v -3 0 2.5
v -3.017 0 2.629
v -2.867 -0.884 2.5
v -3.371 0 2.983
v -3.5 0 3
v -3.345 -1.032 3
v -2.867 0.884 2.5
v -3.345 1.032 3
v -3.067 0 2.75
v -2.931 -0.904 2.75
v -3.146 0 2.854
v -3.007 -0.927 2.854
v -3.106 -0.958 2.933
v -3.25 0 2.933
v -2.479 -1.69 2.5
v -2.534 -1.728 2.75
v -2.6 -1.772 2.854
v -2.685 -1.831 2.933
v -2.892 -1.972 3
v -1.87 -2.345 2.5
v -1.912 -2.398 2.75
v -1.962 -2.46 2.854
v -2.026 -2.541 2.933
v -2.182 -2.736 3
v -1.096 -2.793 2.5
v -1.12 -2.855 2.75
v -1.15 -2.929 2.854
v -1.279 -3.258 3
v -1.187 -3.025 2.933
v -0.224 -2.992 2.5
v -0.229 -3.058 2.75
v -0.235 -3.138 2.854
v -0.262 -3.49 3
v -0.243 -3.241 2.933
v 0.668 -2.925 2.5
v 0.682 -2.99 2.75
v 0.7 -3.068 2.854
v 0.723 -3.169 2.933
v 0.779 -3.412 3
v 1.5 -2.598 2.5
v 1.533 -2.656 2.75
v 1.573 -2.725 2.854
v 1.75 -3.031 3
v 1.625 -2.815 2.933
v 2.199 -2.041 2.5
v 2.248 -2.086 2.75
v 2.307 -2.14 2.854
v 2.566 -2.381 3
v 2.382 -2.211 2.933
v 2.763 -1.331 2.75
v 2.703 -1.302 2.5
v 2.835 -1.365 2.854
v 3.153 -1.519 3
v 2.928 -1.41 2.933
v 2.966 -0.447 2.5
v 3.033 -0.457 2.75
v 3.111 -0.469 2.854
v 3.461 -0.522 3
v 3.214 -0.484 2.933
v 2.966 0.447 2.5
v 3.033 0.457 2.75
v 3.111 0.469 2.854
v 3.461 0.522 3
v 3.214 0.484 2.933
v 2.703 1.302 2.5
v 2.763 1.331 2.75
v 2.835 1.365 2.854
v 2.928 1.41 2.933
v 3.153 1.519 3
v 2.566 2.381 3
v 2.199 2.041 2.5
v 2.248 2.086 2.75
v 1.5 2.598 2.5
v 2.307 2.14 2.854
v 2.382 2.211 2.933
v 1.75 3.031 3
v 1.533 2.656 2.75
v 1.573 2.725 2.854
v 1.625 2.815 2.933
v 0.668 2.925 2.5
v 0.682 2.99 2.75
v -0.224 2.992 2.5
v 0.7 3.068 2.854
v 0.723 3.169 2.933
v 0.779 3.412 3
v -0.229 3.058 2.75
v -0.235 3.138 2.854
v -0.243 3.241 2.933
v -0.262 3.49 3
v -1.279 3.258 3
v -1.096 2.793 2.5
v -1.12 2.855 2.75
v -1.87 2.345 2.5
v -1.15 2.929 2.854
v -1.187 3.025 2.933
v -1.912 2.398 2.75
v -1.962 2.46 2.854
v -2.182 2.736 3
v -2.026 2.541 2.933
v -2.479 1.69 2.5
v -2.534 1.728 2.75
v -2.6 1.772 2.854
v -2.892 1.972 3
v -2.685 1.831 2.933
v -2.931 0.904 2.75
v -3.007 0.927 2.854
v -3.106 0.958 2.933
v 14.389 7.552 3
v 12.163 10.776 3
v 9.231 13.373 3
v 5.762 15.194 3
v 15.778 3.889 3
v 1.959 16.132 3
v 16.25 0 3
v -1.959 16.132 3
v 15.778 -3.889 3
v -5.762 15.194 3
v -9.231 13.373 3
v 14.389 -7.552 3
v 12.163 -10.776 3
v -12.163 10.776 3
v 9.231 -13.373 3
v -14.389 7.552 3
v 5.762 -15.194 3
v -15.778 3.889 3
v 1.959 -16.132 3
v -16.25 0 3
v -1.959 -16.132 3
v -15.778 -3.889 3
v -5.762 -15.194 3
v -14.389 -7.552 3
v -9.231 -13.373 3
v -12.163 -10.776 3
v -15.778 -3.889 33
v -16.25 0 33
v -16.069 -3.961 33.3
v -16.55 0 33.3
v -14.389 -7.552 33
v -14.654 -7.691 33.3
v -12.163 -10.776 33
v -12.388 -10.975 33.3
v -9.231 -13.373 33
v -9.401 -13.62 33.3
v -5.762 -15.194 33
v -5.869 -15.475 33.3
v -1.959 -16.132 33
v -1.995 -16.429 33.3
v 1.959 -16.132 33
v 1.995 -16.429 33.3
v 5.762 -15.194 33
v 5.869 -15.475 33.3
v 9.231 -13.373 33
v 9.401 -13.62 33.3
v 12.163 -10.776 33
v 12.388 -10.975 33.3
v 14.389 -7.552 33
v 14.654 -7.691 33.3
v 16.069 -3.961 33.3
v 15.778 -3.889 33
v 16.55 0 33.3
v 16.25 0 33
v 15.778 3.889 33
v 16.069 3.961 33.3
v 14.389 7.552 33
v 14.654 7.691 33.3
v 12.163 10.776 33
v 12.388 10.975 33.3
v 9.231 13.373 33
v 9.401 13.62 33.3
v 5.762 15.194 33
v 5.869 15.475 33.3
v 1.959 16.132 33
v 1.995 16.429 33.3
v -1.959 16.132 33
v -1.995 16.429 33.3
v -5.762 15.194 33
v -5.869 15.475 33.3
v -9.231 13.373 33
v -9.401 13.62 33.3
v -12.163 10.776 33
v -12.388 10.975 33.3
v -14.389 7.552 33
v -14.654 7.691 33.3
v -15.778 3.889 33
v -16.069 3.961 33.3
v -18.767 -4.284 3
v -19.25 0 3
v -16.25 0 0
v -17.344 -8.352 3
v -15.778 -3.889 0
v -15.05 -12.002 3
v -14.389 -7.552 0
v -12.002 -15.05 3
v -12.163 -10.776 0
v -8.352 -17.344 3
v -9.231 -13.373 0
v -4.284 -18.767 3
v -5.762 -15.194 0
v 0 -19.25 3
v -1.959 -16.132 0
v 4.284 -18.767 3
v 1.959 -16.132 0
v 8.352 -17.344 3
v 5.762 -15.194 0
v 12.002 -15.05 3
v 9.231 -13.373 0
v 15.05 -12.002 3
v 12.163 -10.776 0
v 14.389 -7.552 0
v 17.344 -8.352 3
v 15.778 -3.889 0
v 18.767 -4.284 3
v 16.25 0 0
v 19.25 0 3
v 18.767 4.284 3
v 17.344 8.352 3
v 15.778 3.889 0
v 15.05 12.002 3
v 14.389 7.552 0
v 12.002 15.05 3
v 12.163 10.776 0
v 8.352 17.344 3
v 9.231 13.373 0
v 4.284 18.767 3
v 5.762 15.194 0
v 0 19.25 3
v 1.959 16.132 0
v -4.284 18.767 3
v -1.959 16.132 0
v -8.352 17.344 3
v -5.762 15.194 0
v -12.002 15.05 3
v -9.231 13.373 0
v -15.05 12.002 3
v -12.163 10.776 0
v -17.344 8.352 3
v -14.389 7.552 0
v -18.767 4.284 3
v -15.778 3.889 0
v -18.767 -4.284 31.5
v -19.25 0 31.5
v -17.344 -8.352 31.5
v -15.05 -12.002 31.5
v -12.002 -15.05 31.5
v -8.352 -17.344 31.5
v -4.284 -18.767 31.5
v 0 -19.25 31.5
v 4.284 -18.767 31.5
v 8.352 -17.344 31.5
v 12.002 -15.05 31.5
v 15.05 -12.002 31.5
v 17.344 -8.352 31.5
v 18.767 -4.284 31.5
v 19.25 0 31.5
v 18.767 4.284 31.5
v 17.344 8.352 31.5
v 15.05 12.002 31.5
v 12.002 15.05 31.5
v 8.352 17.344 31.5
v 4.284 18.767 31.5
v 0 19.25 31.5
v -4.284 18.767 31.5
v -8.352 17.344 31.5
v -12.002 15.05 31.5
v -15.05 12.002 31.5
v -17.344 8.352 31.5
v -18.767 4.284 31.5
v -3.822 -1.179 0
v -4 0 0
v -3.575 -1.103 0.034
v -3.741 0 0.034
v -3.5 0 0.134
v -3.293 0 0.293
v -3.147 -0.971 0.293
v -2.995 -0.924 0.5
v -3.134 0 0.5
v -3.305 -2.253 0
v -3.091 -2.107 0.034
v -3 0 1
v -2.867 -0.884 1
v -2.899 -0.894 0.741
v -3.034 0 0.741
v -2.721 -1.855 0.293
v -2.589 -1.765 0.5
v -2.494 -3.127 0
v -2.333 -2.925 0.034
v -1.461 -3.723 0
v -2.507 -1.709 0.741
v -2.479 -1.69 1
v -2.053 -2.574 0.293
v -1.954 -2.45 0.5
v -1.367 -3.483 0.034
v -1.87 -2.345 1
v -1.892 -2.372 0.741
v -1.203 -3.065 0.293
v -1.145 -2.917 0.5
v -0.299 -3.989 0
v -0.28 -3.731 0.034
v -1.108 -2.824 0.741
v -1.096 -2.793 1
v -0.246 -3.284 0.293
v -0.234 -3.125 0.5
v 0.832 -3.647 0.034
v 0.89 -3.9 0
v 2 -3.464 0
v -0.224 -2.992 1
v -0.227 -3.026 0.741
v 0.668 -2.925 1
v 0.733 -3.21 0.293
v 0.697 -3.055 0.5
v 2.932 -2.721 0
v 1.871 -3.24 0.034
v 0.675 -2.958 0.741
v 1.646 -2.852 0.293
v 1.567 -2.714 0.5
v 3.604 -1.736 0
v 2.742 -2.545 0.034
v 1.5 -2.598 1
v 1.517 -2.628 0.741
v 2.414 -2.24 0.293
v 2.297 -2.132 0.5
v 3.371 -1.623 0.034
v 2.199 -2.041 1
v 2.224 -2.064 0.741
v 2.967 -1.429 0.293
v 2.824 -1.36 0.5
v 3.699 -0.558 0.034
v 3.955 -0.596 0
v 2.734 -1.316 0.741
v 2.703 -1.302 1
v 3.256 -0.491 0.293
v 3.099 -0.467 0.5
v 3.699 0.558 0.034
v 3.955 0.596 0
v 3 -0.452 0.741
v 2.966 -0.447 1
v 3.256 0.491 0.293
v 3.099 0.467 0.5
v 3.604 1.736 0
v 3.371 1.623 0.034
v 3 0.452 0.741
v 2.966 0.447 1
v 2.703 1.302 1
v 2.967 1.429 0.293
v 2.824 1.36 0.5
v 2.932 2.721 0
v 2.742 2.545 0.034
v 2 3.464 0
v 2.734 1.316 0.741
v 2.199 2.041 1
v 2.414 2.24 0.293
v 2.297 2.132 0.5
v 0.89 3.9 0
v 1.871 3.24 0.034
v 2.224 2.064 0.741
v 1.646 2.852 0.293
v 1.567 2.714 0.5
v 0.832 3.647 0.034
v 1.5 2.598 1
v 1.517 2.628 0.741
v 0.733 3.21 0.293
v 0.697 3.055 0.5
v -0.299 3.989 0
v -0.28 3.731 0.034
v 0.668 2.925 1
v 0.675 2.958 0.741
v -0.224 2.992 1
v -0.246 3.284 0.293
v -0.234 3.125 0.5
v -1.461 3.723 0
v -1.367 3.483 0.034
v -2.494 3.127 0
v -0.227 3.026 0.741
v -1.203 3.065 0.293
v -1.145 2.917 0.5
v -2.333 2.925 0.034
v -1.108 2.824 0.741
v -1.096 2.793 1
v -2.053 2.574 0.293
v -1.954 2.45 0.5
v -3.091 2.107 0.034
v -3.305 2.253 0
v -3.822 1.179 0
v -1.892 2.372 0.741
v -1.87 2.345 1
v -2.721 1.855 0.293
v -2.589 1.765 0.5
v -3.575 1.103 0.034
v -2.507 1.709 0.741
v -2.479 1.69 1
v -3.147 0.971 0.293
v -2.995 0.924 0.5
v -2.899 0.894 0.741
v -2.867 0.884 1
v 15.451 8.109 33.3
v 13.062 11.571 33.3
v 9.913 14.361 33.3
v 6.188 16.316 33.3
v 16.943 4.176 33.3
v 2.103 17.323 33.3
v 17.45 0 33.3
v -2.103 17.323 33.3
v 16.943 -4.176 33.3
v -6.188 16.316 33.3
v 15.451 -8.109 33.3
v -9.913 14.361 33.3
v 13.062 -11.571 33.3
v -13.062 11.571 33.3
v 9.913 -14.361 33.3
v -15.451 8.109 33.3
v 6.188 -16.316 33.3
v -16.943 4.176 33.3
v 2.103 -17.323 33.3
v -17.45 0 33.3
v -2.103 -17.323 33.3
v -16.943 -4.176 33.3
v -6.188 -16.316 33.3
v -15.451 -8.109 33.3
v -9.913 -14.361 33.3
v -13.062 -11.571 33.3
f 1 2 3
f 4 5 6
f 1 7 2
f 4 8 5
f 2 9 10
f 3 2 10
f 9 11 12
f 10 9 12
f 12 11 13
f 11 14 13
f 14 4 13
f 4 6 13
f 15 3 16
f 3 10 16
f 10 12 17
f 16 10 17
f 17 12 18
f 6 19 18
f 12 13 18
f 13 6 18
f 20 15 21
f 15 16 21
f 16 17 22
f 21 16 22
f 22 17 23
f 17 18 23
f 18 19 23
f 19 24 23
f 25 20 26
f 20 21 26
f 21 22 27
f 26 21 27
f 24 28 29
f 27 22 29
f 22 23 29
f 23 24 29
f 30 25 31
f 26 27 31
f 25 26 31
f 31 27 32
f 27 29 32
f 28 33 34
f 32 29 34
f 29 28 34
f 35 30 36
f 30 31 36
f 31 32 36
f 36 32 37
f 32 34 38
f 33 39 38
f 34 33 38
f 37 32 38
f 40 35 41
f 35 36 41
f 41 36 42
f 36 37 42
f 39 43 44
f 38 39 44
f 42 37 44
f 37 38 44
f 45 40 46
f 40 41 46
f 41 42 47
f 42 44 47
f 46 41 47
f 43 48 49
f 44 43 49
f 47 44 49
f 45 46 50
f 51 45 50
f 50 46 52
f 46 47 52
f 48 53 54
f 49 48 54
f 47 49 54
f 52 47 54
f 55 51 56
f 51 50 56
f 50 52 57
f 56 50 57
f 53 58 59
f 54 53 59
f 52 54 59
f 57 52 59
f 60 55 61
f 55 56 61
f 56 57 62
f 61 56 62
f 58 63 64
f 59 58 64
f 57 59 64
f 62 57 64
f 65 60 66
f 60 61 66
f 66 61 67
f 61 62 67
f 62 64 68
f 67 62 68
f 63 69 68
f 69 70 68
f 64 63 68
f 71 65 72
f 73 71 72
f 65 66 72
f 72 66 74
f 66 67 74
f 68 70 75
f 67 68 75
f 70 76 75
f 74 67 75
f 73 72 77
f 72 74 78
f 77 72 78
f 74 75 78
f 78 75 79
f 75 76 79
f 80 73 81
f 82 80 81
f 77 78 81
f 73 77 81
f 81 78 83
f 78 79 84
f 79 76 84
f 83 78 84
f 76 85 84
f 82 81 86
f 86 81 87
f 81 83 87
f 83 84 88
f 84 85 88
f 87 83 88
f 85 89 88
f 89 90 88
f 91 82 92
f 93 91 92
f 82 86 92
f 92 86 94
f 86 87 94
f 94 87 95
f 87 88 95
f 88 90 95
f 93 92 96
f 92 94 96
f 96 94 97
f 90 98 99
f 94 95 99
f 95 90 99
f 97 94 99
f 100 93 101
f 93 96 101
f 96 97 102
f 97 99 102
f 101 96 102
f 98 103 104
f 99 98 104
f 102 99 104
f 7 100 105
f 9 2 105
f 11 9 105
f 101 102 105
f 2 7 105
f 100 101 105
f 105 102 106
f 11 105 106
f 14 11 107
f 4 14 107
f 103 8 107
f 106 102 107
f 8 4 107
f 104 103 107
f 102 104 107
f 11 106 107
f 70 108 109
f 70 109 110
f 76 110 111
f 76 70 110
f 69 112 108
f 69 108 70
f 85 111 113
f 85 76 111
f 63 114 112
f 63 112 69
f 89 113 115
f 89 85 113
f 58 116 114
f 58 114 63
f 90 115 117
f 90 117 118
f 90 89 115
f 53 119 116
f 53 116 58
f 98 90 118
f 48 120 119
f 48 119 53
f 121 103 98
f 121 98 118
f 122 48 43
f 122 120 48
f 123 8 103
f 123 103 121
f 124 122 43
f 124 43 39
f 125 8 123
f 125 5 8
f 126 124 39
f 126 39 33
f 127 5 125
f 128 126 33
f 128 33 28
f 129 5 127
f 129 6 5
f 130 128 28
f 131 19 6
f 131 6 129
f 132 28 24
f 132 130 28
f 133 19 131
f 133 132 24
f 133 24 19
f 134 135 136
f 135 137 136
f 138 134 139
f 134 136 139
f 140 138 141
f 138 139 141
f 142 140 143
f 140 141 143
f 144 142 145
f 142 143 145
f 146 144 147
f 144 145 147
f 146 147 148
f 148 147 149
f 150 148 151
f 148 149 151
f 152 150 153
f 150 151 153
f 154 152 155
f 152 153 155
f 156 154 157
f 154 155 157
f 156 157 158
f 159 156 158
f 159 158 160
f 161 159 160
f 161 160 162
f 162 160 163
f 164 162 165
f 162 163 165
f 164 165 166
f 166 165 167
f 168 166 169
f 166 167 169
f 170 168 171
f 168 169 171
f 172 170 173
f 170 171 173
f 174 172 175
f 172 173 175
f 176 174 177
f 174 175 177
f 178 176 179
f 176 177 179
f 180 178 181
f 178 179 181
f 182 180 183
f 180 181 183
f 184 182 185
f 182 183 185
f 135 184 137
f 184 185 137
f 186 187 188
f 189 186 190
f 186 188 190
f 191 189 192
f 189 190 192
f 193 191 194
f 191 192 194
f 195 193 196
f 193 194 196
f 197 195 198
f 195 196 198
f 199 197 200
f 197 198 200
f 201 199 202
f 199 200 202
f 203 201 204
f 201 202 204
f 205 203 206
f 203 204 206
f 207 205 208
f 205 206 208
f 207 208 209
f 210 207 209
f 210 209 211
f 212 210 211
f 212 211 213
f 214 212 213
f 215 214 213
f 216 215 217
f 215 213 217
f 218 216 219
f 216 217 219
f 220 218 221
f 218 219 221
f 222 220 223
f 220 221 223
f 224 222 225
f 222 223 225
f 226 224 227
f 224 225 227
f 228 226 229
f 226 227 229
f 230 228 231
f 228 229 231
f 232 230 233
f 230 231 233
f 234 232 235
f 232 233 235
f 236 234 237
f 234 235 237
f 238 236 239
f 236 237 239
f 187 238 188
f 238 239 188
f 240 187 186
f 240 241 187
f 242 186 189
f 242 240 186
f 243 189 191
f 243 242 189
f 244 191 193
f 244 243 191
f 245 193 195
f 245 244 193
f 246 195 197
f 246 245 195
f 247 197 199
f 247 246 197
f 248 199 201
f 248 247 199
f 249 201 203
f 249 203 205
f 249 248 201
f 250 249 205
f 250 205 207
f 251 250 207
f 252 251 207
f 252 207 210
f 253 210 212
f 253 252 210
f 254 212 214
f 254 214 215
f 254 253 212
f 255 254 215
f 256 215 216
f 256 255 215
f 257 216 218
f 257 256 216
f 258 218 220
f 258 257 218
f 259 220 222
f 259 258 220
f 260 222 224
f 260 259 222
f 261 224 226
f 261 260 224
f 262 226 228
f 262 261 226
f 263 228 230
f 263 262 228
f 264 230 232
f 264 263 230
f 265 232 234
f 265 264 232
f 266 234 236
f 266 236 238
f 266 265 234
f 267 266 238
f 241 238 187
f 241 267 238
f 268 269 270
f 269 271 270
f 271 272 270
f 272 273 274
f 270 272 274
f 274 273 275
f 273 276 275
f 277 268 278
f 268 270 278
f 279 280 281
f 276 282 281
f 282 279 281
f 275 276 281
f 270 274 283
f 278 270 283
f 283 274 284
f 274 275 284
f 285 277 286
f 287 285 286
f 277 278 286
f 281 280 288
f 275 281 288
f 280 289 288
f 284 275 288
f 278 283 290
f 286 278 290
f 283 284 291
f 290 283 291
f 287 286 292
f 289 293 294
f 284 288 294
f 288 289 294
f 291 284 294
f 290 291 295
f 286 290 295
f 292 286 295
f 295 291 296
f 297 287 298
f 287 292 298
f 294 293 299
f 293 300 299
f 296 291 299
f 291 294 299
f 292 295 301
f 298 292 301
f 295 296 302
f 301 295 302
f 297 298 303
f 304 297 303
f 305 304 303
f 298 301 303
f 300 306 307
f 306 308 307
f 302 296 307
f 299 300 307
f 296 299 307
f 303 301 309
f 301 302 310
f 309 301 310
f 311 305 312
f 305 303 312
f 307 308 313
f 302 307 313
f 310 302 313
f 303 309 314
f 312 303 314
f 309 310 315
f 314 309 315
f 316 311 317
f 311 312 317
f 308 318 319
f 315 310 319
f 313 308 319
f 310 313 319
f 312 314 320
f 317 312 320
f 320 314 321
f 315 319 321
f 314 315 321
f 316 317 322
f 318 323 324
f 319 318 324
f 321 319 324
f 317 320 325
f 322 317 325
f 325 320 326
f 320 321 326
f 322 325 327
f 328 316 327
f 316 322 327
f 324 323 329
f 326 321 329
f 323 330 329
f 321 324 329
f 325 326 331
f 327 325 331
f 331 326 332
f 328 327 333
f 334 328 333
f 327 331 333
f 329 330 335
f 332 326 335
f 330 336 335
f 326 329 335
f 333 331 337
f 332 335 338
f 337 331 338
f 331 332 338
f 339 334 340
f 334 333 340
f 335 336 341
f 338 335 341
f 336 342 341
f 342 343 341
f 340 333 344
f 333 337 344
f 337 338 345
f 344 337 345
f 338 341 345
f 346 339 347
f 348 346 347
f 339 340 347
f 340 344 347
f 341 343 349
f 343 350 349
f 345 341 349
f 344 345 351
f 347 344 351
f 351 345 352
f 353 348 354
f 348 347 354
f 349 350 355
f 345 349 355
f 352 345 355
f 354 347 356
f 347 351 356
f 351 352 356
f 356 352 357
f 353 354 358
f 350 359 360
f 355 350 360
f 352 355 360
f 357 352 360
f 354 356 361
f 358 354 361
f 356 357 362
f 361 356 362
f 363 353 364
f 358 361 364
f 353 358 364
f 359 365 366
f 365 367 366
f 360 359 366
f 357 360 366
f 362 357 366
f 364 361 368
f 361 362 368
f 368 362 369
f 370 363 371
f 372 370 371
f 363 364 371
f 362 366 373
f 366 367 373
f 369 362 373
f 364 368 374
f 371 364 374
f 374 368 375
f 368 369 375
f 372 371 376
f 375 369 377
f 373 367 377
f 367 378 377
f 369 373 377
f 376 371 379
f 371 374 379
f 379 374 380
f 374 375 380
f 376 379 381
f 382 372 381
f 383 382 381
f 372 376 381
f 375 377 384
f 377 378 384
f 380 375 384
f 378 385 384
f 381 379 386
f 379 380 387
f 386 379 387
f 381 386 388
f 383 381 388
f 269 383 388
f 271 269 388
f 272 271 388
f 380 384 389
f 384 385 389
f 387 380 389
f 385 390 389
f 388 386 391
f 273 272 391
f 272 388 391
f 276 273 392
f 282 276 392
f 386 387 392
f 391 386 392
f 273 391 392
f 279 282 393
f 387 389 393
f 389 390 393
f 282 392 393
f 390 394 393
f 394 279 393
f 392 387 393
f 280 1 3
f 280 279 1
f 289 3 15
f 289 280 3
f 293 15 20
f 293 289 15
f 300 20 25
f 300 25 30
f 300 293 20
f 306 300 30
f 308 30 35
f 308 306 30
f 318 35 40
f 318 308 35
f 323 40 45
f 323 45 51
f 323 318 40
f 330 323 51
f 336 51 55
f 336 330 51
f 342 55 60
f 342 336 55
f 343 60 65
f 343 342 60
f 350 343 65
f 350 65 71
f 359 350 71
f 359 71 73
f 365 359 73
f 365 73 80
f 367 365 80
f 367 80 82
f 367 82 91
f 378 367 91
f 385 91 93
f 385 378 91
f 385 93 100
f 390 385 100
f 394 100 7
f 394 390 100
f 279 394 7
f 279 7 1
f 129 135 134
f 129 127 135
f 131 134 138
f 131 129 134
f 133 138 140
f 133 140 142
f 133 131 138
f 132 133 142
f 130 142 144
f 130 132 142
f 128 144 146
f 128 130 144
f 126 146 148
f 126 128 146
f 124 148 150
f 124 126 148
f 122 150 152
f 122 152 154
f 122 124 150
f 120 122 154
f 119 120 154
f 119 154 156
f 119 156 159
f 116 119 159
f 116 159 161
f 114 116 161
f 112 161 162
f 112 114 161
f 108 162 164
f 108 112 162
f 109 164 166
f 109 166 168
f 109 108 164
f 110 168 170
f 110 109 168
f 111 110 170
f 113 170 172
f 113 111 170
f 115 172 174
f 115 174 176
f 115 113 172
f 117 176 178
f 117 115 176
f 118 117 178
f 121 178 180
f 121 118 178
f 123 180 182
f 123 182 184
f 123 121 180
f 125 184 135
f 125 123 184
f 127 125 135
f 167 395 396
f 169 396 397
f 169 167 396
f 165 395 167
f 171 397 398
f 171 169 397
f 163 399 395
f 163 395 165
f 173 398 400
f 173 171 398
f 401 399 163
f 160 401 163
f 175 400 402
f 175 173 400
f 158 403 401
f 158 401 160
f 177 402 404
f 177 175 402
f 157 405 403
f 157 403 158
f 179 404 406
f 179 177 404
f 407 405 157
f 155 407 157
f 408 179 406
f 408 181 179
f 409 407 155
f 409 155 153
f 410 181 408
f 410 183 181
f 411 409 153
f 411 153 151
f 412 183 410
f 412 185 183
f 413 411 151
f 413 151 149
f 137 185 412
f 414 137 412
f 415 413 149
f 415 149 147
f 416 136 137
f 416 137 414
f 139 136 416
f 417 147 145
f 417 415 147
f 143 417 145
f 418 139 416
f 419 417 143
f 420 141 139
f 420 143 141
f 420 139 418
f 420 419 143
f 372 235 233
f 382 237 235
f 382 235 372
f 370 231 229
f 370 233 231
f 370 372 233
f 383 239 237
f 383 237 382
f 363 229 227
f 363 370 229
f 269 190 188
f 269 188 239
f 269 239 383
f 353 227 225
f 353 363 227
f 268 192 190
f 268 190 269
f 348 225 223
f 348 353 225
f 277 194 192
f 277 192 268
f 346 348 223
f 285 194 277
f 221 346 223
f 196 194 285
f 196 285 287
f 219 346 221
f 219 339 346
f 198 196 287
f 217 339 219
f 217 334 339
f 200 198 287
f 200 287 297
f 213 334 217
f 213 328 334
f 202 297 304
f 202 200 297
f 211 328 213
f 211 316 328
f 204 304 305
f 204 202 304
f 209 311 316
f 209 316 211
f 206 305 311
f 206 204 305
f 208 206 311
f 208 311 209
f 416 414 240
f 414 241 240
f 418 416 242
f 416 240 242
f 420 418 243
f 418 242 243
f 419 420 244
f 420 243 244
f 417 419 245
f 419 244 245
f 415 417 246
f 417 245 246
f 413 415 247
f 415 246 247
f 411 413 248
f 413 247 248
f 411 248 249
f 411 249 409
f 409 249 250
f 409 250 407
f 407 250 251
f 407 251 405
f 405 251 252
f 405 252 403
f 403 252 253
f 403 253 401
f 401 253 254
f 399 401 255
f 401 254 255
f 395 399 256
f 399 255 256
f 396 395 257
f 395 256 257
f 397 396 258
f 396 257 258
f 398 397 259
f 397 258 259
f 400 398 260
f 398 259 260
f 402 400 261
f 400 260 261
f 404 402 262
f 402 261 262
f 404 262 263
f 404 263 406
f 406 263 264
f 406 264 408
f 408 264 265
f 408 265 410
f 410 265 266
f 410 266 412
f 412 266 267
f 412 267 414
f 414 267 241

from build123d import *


with BuildPart() as part:
    # Sketch → Revolution (revolve)
    with BuildSketch(Plane.XZ):
        with BuildLine():
            Line((-16.25, 33), (-16.25, 3))
            Line((-16.25, 3), (-3.5, 3))
            ThreePointArc((-3, 2.5), (-3.146447, 2.853553), (-3.5, 3))
            Line((-3, 2.5), (-3, 1))
            ThreePointArc((-4, 0), (-3.292893, 0.292893), (-3, 1))
            Line((-4, 0), (-16.25, 0))
            Line((-19.25, 3), (-16.25, 0))
            Line((-19.25, 3), (-19.25, 31.5))
            Line((-17.45, 33.3), (-19.25, 31.5))
            Line((-17.45, 33.3), (-16.55, 33.3))
            Line((-16.25, 33), (-16.55, 33.3))
        make_face()
    revolve(axis=Axis((0, 0, 0), (0, 0, 1)))


solid = part.part
